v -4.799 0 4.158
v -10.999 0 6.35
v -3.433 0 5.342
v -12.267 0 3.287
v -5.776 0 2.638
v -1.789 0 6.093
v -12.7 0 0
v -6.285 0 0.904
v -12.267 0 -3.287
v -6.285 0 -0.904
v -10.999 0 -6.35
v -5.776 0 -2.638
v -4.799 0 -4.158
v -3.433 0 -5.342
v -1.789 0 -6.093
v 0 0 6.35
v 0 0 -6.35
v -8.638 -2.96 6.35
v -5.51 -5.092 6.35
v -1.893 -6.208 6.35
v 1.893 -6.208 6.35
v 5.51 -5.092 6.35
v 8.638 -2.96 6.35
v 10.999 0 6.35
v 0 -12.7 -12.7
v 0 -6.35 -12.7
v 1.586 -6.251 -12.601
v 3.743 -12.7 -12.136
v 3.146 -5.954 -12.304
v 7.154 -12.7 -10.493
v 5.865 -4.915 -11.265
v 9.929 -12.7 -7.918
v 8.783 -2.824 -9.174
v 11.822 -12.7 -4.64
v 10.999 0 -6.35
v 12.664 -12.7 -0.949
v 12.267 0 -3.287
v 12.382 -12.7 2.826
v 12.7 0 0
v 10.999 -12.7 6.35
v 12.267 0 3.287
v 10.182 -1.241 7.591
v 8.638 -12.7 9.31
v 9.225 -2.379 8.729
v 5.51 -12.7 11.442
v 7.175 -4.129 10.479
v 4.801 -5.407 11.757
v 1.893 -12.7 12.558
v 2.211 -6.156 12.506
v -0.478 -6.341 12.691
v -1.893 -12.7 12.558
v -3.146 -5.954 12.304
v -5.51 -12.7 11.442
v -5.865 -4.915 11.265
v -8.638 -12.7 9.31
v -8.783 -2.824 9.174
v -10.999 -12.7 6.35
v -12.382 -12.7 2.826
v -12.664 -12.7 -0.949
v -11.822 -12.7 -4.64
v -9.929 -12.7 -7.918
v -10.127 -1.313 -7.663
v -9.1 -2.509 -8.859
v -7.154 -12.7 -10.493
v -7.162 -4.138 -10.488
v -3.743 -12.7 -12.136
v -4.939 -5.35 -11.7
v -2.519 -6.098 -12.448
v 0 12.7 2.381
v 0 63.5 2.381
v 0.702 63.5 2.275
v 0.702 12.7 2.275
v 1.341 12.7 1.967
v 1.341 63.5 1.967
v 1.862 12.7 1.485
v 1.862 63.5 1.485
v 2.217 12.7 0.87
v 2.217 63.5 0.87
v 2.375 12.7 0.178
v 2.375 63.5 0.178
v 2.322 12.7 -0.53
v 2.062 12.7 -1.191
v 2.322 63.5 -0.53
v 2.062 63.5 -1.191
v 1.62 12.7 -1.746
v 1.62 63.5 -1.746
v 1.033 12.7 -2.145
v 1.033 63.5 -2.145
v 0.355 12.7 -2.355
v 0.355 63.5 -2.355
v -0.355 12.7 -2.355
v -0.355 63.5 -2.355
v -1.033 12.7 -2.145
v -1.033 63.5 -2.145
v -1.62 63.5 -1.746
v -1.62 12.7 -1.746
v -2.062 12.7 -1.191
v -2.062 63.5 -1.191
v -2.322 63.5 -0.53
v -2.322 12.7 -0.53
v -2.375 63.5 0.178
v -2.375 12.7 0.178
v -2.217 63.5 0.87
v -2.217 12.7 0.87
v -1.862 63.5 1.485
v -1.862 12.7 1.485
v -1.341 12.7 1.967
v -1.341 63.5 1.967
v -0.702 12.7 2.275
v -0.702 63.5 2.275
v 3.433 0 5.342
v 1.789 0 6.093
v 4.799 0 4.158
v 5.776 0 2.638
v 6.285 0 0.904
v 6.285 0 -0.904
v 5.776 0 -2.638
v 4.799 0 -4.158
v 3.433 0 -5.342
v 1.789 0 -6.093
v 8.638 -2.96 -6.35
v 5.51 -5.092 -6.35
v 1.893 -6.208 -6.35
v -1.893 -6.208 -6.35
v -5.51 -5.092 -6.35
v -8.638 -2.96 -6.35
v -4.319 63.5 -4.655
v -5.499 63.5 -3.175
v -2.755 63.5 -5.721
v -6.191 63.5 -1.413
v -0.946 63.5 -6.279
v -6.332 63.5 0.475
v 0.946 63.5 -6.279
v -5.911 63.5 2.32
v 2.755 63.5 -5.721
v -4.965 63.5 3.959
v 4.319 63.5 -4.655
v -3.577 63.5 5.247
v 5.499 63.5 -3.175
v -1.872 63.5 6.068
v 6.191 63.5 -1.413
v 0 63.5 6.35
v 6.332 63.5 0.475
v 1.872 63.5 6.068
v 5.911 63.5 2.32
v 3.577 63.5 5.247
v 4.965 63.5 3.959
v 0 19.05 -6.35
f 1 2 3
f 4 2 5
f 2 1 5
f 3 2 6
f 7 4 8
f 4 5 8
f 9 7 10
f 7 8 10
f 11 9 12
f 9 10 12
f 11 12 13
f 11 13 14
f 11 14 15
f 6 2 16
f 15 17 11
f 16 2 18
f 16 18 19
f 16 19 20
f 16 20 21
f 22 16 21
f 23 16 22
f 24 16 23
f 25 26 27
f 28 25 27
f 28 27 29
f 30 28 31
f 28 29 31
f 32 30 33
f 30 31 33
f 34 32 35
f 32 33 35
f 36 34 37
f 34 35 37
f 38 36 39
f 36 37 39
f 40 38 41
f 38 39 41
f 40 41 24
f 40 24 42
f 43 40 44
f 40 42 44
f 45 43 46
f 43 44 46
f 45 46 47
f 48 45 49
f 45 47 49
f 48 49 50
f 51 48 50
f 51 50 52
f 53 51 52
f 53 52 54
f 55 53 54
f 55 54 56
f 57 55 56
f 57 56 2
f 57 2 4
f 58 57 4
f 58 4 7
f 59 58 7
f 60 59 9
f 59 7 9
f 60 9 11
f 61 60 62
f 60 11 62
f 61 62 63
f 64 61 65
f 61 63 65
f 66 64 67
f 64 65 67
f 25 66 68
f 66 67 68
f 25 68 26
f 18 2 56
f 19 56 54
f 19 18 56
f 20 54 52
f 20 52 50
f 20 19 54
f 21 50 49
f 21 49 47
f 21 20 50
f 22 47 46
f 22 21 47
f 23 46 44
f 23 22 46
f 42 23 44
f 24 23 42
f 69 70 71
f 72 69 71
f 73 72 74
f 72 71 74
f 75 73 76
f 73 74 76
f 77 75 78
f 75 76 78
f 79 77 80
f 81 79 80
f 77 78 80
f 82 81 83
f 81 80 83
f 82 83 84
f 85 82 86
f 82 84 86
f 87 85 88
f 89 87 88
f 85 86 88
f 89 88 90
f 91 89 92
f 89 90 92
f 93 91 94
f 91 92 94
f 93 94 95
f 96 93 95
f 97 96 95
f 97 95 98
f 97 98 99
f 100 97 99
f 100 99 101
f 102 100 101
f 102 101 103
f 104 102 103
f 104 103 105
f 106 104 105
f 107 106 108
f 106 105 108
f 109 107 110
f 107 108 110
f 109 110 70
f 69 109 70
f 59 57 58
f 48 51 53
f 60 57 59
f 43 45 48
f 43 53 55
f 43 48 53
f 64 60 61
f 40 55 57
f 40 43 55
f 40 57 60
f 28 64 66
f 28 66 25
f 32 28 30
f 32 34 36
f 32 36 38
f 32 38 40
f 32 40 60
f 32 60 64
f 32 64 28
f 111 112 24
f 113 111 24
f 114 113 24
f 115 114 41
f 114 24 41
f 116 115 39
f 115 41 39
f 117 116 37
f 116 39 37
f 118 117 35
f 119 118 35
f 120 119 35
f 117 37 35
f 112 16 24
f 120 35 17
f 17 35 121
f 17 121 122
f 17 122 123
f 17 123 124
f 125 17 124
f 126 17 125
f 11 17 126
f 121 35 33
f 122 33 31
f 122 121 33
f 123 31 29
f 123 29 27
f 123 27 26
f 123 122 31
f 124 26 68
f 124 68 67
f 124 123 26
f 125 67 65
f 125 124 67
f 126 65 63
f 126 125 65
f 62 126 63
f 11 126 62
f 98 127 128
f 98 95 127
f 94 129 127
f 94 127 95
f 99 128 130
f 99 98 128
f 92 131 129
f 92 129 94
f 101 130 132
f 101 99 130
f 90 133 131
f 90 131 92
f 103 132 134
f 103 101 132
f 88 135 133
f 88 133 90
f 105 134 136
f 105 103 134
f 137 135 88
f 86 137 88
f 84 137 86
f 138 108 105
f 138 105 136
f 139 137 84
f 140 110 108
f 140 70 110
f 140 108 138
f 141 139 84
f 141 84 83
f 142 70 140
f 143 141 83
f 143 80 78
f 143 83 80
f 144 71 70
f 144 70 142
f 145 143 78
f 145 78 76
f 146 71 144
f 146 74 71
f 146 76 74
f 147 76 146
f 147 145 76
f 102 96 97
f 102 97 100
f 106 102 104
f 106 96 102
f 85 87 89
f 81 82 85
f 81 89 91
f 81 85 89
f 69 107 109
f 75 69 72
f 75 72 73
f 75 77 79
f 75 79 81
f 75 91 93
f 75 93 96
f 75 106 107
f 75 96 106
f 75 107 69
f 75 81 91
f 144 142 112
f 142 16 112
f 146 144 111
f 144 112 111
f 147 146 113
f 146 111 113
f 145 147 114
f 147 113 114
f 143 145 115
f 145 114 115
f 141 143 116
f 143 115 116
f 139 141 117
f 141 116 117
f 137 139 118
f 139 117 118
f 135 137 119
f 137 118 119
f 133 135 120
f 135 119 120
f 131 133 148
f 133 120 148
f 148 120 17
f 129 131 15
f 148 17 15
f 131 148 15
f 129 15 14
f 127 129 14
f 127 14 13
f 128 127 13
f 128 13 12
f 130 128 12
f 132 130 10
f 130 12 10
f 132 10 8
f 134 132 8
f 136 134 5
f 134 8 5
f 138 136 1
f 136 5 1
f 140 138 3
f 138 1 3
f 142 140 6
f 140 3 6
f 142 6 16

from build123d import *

# Parameters (mm, degrees)
SKETCH1_R           = 6.35
BOSS_EXTRUDE1_DEPTH = 63.5
SKETCH5_R           = 12.7
BOSS_EXTRUDE2_DEPTH = 12.7
SKETCH10_R          = 12.7
CUT_EXTRUDE5_DEPTH  = 68.501425911
SKETCH12_R          = 12.7
CUT_EXTRUDE6_DEPTH  = 68.501425911
SKETCH13_R          = 2.38125
CUT_EXTRUDE7_DEPTH  = 50.8


with BuildPart() as part:
    # Sketch1 → Boss-Extrude1 (new body)
    with BuildSketch(Plane(origin=(0, 0, 0), x_dir=(1, 0, 0), z_dir=(0, 1, 0))):
        with Locations(Location((0, 0, 0), (0, 0, 270))):
            Circle(SKETCH1_R)
    extrude(amount=BOSS_EXTRUDE1_DEPTH)

    # Sketch5 → Boss-Extrude2 (add)
    with BuildSketch(Plane.XZ):
        with Locations(Location((0, 0, 0), (0, 0, 270))):
            Circle(SKETCH5_R)
    extrude(amount=BOSS_EXTRUDE2_DEPTH)

    # Sketch10 → Cut-Extrude5 (cut, through all)
    with BuildSketch(Plane.XY.offset(6.35)):
        with Locations((0, 6.35)):
            Circle(SKETCH10_R)
    extrude(amount=CUT_EXTRUDE5_DEPTH, mode=Mode.SUBTRACT)

    # Sketch12 → Cut-Extrude6 (cut, through all)
    with BuildSketch(Plane(origin=(0, 0, -6.35), x_dir=(-1, 0, 0), z_dir=(0, 0, -1))):
        with Locations((0, 6.35)):
            Circle(SKETCH12_R)
    extrude(amount=CUT_EXTRUDE6_DEPTH, mode=Mode.SUBTRACT)

    # Sketch13 → Cut-Extrude7 (cut)
    with BuildSketch(Plane(origin=(0, 63.5, 0), x_dir=(1, 0, 0), z_dir=(0, 1, 0))):
        with Locations(Location((0, 0, 0), (0, 0, 270))):
            Circle(SKETCH13_R)
    extrude(amount=-CUT_EXTRUDE7_DEPTH, mode=Mode.SUBTRACT)


solid = part.part
